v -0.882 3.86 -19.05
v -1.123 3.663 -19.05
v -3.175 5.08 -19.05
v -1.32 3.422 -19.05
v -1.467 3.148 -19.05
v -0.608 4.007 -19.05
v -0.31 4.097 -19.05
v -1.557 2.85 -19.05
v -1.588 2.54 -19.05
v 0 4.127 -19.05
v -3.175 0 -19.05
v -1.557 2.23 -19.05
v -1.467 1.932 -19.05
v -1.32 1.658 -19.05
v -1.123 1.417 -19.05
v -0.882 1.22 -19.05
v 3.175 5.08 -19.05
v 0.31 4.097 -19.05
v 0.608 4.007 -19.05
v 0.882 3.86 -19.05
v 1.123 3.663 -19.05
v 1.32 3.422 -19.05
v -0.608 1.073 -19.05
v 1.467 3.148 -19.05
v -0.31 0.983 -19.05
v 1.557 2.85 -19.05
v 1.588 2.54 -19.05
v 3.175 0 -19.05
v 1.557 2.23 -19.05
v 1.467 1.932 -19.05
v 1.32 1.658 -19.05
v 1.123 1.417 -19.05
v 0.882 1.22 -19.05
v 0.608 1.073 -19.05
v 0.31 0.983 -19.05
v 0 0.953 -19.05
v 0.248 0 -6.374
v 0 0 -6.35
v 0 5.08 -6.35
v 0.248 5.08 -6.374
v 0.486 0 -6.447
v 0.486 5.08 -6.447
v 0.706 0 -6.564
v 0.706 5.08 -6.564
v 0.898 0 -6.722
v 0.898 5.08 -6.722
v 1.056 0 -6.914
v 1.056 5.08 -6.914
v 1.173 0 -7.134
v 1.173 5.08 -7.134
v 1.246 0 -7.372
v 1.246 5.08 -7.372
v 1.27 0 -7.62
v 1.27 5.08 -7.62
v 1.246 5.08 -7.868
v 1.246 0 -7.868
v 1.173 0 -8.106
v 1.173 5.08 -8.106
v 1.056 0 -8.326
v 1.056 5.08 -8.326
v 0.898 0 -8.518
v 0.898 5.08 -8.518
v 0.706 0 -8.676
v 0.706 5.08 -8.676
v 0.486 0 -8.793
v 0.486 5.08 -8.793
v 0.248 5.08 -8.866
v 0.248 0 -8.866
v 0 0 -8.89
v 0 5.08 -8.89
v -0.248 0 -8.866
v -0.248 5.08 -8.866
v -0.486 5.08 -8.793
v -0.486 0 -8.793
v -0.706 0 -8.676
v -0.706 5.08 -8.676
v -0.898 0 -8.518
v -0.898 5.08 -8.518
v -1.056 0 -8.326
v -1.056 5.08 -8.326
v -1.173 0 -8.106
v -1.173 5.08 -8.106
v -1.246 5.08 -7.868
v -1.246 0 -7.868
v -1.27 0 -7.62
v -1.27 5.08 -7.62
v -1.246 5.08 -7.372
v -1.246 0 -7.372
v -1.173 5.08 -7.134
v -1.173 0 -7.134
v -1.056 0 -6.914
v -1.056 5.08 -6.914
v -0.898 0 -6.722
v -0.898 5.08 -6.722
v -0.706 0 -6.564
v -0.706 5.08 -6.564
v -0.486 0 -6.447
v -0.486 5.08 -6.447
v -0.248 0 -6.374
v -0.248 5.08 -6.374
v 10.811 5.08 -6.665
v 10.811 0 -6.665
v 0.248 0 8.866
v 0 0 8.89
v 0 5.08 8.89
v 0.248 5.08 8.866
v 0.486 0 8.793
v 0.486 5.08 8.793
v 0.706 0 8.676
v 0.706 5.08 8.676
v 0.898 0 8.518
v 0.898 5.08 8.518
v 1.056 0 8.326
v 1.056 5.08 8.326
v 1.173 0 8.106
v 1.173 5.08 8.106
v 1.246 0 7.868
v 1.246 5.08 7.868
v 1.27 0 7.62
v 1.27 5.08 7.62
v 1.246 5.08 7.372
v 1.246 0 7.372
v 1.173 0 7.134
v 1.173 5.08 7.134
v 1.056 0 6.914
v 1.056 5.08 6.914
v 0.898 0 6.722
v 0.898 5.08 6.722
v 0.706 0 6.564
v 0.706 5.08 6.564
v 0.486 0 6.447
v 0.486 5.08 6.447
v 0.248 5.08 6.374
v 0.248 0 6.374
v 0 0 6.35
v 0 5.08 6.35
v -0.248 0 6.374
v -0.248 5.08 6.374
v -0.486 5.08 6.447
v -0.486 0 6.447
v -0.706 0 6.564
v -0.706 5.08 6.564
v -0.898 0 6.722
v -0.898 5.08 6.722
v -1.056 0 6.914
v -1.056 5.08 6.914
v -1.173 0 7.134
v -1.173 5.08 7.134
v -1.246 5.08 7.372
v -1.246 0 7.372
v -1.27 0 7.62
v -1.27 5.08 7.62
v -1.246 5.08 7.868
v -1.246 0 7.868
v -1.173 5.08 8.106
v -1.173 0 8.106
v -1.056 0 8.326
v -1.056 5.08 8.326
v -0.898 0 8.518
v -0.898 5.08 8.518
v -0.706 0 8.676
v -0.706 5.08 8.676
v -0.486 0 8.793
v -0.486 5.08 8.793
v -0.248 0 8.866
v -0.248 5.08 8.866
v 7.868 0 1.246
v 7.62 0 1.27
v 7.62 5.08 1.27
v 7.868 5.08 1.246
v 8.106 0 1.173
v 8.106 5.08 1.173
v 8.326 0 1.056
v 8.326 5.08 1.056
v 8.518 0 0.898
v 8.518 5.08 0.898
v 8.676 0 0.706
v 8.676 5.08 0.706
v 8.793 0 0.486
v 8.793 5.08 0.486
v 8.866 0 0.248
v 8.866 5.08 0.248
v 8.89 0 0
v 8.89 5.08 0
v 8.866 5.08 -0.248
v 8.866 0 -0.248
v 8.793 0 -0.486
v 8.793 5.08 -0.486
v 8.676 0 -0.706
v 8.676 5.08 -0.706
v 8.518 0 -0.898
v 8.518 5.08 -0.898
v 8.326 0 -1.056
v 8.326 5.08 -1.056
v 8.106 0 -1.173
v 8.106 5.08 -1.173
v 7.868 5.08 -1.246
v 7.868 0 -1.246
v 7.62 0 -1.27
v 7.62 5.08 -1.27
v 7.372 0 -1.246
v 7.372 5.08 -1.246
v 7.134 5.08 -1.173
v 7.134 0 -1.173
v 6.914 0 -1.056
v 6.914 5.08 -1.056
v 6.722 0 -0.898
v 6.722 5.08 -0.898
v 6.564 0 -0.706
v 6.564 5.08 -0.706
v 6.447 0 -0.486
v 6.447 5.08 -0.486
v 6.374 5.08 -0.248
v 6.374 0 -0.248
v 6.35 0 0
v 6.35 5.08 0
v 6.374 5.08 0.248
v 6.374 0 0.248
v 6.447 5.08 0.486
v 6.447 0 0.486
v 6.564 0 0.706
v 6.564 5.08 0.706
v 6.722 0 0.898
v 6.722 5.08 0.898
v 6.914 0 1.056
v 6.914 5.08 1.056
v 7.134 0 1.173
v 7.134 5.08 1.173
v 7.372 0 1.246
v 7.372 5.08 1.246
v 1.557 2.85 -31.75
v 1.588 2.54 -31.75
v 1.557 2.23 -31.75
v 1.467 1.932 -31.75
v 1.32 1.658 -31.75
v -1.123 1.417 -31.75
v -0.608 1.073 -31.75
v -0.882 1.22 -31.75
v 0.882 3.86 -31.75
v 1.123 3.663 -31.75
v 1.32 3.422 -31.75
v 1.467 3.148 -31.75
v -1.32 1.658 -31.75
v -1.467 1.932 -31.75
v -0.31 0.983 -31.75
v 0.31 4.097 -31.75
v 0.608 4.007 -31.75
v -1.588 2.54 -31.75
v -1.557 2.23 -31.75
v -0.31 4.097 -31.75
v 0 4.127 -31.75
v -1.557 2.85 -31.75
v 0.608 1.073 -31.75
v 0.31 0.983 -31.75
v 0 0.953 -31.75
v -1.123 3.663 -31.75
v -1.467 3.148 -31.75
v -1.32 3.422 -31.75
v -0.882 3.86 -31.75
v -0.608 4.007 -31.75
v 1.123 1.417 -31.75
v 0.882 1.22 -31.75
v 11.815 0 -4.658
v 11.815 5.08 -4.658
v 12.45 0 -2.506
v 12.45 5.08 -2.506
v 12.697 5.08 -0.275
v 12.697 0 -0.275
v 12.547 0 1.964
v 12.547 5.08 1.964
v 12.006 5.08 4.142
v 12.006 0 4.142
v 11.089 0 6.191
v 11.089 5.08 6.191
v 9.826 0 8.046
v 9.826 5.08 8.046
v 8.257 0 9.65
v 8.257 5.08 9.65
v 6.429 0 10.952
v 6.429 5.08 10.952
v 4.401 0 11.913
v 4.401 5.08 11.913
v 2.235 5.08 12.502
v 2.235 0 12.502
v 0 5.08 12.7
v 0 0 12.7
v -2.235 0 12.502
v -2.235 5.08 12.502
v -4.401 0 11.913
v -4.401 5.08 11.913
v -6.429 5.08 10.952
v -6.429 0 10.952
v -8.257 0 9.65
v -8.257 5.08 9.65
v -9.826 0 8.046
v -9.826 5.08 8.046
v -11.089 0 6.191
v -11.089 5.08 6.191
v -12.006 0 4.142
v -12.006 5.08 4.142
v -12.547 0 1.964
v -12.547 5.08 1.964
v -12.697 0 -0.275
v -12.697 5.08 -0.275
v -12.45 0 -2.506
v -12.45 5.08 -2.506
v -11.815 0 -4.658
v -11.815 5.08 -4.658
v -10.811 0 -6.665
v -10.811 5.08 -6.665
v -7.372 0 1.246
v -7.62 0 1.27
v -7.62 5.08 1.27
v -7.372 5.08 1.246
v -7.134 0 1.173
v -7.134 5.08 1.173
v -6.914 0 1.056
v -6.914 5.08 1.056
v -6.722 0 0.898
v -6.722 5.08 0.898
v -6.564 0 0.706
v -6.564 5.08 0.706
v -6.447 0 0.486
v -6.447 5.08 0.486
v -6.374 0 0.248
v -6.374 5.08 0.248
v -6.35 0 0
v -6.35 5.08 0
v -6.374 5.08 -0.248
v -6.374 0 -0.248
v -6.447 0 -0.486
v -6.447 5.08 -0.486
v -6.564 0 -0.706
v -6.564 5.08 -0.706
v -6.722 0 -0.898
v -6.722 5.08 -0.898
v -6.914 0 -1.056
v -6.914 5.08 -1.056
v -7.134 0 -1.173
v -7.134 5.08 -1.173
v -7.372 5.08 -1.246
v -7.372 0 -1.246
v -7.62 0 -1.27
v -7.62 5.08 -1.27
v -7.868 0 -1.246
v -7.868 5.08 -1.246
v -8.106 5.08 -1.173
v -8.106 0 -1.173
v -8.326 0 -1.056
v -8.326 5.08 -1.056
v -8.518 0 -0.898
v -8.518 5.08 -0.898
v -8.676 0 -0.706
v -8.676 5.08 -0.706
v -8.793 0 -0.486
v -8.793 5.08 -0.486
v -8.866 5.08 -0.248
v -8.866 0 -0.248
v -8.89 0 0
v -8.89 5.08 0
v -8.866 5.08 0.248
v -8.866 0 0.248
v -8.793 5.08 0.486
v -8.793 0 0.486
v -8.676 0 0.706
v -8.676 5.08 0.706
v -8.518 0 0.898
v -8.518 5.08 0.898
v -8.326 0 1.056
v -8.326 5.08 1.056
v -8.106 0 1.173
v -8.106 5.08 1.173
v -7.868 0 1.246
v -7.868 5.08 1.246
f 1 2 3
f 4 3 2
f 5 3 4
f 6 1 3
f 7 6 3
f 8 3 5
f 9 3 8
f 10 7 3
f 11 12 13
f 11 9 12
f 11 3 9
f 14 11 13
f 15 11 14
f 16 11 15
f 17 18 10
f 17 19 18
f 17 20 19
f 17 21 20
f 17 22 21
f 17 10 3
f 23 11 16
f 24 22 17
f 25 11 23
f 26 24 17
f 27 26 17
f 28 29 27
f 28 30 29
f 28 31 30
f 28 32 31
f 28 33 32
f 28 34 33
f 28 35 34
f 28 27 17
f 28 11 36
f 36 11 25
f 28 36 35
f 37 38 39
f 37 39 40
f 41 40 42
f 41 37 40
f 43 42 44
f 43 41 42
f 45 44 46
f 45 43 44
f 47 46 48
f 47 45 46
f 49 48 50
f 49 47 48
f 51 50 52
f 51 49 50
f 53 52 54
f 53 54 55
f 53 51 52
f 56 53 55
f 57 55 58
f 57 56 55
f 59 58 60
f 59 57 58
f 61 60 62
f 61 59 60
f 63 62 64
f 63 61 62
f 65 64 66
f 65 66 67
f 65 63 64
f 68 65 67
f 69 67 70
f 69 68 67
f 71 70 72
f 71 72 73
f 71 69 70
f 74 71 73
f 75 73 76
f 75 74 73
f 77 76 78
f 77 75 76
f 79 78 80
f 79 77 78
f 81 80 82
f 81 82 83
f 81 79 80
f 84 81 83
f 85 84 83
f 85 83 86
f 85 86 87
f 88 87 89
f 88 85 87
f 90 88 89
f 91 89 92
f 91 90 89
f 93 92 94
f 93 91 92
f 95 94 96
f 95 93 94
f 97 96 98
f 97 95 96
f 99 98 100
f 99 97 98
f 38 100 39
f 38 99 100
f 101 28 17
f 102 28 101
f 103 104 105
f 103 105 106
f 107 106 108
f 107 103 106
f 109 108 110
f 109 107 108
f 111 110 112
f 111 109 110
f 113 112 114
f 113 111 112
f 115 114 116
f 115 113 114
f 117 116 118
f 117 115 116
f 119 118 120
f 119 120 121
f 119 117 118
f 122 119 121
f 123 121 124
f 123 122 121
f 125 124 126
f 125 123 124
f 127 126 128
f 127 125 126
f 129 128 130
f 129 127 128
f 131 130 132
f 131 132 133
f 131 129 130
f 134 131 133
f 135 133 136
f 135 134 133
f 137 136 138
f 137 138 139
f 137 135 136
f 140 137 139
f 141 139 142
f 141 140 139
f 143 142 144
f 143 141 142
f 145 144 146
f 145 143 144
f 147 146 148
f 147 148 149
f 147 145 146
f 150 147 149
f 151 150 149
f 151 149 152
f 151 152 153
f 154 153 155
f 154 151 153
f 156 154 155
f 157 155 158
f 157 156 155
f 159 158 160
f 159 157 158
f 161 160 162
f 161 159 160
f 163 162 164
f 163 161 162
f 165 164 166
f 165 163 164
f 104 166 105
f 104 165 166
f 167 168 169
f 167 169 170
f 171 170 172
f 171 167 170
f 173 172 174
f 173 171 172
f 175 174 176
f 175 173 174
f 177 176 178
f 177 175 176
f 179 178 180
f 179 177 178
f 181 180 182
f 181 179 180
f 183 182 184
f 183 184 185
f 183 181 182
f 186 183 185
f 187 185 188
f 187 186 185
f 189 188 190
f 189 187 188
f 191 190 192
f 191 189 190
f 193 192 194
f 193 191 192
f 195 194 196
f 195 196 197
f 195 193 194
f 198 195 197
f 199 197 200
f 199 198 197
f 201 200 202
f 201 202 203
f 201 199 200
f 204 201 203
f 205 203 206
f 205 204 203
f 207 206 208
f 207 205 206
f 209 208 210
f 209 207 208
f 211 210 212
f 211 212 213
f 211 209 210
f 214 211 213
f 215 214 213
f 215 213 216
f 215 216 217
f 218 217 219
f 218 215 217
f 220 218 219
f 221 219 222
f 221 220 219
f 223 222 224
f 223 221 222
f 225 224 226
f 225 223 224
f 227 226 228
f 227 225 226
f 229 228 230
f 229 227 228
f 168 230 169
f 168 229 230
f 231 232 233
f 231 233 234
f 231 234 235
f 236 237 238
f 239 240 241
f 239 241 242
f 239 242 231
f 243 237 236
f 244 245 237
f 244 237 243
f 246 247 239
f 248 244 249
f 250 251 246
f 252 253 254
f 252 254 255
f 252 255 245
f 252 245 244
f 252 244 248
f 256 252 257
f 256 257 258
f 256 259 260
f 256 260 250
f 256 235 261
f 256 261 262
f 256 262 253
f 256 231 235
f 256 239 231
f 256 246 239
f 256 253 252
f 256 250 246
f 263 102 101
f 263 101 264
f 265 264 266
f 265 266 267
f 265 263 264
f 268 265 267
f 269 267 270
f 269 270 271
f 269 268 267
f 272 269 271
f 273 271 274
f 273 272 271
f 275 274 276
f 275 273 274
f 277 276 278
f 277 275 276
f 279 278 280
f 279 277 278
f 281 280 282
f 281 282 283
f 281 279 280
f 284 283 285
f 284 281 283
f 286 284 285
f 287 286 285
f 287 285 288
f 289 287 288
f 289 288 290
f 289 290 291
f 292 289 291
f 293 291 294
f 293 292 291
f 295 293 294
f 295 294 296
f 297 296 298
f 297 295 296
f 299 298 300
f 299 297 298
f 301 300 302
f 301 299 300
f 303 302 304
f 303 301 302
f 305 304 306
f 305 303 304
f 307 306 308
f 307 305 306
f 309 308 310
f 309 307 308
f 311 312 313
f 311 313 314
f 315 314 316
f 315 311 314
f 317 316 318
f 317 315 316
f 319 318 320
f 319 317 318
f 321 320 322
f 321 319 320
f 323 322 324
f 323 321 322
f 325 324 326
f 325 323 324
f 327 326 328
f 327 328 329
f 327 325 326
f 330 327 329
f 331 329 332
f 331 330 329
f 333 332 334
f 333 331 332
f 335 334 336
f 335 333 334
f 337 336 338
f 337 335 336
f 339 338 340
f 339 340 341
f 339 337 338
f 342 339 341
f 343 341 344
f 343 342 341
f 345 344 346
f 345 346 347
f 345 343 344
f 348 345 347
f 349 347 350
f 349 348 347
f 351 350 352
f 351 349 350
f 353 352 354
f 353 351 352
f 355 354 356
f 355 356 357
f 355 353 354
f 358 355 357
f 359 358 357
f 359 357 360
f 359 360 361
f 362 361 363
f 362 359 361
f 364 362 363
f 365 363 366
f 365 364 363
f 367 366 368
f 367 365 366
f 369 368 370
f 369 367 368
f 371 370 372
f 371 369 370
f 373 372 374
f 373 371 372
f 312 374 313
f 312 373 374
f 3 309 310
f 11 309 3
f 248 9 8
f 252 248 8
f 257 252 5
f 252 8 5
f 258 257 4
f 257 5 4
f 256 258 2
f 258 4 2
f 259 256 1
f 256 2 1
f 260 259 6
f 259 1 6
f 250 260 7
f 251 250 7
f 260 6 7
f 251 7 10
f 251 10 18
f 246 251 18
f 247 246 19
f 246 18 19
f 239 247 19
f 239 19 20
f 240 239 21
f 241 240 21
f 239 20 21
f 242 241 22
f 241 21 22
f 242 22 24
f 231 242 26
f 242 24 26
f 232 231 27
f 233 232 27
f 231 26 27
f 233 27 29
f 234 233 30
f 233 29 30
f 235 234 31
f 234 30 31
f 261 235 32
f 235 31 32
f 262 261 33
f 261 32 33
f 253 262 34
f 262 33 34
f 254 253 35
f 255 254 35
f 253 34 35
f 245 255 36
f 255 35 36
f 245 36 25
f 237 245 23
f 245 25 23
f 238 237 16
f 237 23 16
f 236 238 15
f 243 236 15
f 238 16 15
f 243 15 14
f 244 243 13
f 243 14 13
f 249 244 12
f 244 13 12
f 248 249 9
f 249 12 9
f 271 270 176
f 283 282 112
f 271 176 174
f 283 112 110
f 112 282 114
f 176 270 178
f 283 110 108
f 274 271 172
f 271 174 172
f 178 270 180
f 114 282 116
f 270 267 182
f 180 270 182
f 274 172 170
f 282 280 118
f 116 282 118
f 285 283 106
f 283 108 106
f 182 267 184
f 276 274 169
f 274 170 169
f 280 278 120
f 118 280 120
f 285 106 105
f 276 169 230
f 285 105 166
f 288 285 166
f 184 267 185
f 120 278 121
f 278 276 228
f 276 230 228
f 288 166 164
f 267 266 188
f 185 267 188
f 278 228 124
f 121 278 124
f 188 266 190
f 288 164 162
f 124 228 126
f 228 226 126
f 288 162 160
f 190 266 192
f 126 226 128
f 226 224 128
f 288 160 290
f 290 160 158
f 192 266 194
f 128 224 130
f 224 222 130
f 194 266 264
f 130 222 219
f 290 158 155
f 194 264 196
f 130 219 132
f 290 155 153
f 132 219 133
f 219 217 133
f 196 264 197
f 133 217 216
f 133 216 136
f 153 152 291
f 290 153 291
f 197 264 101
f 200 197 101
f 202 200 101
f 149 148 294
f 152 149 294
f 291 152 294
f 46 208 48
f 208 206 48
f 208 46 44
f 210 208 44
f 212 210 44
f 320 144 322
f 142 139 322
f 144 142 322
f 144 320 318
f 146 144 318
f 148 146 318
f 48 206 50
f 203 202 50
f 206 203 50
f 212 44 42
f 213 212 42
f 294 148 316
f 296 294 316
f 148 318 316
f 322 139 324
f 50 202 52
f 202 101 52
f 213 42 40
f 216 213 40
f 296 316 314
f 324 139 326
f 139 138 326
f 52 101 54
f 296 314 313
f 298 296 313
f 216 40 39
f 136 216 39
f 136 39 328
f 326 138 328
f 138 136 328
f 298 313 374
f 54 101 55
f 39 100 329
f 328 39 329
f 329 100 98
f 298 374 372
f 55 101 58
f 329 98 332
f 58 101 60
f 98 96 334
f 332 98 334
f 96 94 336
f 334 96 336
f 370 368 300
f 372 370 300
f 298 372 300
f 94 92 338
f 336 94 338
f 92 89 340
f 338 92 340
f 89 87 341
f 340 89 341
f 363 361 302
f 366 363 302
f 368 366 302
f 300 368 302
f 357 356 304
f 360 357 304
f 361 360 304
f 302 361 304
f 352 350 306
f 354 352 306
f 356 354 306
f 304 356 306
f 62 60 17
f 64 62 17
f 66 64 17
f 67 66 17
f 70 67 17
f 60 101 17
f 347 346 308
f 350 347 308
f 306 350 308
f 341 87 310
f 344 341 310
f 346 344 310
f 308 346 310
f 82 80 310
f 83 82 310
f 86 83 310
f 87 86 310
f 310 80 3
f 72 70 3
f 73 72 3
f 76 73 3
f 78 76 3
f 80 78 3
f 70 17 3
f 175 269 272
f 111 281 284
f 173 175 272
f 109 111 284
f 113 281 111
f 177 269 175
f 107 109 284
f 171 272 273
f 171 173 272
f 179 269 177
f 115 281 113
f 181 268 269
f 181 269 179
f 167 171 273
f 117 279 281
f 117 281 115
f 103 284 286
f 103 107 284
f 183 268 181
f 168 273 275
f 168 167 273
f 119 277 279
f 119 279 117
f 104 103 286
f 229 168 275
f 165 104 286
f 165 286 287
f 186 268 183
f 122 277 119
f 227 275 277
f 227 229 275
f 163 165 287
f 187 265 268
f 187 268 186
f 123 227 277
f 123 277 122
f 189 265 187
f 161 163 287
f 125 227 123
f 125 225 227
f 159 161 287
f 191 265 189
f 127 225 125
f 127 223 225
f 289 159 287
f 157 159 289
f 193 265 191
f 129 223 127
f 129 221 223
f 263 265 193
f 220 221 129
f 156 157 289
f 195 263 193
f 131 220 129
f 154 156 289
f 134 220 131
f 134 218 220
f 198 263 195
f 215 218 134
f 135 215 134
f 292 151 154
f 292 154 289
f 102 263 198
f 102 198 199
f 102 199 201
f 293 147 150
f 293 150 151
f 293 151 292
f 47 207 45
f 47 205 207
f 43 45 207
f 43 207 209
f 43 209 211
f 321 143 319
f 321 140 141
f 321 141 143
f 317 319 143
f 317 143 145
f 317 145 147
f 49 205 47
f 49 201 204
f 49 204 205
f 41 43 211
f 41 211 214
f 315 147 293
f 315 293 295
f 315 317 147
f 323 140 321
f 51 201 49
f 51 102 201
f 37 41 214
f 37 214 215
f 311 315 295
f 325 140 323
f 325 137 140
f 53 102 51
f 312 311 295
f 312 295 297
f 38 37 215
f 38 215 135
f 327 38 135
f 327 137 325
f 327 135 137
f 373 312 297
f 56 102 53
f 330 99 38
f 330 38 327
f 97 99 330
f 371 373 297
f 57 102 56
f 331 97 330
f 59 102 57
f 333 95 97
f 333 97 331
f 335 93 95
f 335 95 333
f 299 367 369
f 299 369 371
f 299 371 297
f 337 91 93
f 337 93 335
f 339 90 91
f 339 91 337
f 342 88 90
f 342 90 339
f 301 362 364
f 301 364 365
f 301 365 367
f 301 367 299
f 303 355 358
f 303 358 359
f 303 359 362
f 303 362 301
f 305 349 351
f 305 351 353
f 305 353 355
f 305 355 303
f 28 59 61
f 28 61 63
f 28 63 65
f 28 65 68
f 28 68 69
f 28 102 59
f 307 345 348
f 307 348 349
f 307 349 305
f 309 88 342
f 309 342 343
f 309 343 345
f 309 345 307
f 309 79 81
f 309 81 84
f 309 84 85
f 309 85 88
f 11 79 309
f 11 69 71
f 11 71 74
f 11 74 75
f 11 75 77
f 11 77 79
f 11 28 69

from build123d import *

# Parameters (mm, degrees)
SKETCH1_R           = 1.27
BOSS_EXTRUDE1_DEPTH = 5.08
SKETCH2_R           = 1.5875
BOSS_EXTRUDE2_DEPTH = 12.7


with BuildPart() as part:
    # Sketch1 → Boss-Extrude1 (new body)
    with BuildSketch(Plane(origin=(0, 0, 0), x_dir=(1, 0, 0), z_dir=(0, 1, 0))):
        with BuildLine():
            Line((-10.810601837, 6.664899694), (-3.175, 19.05))
            Line((-3.175, 19.05), (3.175, 19.05))
            Line((3.175, 19.05), (10.810601837, 6.664899694))
            ThreePointArc((10.810601837, 6.664899694), (0, -12.7), (-10.810601837, 6.664899694))
        make_face()
        with Locations(Location((0, 7.62, 0), (0, 0, 270))):
            Circle(SKETCH1_R, mode=Mode.SUBTRACT)
        with Locations(Location((7.62, 0, 0), (0, 0, 270))):
            Circle(SKETCH1_R, mode=Mode.SUBTRACT)
        with Locations(Location((0, -7.62, 0), (0, 0, 270))):
            Circle(SKETCH1_R, mode=Mode.SUBTRACT)
        with Locations(Location((-7.62, 0, 0), (0, 0, 270))):
            Circle(SKETCH1_R, mode=Mode.SUBTRACT)
    extrude(amount=BOSS_EXTRUDE1_DEPTH)

    # Sketch2 → Boss-Extrude2 (add)
    with BuildSketch(Plane(origin=(0, 0, -19.05), x_dir=(-1, 0, 0), z_dir=(0, 0, -1))):
        with Locations((0, 2.54)):
            Circle(SKETCH2_R)
    extrude(amount=BOSS_EXTRUDE2_DEPTH)


solid = part.part
